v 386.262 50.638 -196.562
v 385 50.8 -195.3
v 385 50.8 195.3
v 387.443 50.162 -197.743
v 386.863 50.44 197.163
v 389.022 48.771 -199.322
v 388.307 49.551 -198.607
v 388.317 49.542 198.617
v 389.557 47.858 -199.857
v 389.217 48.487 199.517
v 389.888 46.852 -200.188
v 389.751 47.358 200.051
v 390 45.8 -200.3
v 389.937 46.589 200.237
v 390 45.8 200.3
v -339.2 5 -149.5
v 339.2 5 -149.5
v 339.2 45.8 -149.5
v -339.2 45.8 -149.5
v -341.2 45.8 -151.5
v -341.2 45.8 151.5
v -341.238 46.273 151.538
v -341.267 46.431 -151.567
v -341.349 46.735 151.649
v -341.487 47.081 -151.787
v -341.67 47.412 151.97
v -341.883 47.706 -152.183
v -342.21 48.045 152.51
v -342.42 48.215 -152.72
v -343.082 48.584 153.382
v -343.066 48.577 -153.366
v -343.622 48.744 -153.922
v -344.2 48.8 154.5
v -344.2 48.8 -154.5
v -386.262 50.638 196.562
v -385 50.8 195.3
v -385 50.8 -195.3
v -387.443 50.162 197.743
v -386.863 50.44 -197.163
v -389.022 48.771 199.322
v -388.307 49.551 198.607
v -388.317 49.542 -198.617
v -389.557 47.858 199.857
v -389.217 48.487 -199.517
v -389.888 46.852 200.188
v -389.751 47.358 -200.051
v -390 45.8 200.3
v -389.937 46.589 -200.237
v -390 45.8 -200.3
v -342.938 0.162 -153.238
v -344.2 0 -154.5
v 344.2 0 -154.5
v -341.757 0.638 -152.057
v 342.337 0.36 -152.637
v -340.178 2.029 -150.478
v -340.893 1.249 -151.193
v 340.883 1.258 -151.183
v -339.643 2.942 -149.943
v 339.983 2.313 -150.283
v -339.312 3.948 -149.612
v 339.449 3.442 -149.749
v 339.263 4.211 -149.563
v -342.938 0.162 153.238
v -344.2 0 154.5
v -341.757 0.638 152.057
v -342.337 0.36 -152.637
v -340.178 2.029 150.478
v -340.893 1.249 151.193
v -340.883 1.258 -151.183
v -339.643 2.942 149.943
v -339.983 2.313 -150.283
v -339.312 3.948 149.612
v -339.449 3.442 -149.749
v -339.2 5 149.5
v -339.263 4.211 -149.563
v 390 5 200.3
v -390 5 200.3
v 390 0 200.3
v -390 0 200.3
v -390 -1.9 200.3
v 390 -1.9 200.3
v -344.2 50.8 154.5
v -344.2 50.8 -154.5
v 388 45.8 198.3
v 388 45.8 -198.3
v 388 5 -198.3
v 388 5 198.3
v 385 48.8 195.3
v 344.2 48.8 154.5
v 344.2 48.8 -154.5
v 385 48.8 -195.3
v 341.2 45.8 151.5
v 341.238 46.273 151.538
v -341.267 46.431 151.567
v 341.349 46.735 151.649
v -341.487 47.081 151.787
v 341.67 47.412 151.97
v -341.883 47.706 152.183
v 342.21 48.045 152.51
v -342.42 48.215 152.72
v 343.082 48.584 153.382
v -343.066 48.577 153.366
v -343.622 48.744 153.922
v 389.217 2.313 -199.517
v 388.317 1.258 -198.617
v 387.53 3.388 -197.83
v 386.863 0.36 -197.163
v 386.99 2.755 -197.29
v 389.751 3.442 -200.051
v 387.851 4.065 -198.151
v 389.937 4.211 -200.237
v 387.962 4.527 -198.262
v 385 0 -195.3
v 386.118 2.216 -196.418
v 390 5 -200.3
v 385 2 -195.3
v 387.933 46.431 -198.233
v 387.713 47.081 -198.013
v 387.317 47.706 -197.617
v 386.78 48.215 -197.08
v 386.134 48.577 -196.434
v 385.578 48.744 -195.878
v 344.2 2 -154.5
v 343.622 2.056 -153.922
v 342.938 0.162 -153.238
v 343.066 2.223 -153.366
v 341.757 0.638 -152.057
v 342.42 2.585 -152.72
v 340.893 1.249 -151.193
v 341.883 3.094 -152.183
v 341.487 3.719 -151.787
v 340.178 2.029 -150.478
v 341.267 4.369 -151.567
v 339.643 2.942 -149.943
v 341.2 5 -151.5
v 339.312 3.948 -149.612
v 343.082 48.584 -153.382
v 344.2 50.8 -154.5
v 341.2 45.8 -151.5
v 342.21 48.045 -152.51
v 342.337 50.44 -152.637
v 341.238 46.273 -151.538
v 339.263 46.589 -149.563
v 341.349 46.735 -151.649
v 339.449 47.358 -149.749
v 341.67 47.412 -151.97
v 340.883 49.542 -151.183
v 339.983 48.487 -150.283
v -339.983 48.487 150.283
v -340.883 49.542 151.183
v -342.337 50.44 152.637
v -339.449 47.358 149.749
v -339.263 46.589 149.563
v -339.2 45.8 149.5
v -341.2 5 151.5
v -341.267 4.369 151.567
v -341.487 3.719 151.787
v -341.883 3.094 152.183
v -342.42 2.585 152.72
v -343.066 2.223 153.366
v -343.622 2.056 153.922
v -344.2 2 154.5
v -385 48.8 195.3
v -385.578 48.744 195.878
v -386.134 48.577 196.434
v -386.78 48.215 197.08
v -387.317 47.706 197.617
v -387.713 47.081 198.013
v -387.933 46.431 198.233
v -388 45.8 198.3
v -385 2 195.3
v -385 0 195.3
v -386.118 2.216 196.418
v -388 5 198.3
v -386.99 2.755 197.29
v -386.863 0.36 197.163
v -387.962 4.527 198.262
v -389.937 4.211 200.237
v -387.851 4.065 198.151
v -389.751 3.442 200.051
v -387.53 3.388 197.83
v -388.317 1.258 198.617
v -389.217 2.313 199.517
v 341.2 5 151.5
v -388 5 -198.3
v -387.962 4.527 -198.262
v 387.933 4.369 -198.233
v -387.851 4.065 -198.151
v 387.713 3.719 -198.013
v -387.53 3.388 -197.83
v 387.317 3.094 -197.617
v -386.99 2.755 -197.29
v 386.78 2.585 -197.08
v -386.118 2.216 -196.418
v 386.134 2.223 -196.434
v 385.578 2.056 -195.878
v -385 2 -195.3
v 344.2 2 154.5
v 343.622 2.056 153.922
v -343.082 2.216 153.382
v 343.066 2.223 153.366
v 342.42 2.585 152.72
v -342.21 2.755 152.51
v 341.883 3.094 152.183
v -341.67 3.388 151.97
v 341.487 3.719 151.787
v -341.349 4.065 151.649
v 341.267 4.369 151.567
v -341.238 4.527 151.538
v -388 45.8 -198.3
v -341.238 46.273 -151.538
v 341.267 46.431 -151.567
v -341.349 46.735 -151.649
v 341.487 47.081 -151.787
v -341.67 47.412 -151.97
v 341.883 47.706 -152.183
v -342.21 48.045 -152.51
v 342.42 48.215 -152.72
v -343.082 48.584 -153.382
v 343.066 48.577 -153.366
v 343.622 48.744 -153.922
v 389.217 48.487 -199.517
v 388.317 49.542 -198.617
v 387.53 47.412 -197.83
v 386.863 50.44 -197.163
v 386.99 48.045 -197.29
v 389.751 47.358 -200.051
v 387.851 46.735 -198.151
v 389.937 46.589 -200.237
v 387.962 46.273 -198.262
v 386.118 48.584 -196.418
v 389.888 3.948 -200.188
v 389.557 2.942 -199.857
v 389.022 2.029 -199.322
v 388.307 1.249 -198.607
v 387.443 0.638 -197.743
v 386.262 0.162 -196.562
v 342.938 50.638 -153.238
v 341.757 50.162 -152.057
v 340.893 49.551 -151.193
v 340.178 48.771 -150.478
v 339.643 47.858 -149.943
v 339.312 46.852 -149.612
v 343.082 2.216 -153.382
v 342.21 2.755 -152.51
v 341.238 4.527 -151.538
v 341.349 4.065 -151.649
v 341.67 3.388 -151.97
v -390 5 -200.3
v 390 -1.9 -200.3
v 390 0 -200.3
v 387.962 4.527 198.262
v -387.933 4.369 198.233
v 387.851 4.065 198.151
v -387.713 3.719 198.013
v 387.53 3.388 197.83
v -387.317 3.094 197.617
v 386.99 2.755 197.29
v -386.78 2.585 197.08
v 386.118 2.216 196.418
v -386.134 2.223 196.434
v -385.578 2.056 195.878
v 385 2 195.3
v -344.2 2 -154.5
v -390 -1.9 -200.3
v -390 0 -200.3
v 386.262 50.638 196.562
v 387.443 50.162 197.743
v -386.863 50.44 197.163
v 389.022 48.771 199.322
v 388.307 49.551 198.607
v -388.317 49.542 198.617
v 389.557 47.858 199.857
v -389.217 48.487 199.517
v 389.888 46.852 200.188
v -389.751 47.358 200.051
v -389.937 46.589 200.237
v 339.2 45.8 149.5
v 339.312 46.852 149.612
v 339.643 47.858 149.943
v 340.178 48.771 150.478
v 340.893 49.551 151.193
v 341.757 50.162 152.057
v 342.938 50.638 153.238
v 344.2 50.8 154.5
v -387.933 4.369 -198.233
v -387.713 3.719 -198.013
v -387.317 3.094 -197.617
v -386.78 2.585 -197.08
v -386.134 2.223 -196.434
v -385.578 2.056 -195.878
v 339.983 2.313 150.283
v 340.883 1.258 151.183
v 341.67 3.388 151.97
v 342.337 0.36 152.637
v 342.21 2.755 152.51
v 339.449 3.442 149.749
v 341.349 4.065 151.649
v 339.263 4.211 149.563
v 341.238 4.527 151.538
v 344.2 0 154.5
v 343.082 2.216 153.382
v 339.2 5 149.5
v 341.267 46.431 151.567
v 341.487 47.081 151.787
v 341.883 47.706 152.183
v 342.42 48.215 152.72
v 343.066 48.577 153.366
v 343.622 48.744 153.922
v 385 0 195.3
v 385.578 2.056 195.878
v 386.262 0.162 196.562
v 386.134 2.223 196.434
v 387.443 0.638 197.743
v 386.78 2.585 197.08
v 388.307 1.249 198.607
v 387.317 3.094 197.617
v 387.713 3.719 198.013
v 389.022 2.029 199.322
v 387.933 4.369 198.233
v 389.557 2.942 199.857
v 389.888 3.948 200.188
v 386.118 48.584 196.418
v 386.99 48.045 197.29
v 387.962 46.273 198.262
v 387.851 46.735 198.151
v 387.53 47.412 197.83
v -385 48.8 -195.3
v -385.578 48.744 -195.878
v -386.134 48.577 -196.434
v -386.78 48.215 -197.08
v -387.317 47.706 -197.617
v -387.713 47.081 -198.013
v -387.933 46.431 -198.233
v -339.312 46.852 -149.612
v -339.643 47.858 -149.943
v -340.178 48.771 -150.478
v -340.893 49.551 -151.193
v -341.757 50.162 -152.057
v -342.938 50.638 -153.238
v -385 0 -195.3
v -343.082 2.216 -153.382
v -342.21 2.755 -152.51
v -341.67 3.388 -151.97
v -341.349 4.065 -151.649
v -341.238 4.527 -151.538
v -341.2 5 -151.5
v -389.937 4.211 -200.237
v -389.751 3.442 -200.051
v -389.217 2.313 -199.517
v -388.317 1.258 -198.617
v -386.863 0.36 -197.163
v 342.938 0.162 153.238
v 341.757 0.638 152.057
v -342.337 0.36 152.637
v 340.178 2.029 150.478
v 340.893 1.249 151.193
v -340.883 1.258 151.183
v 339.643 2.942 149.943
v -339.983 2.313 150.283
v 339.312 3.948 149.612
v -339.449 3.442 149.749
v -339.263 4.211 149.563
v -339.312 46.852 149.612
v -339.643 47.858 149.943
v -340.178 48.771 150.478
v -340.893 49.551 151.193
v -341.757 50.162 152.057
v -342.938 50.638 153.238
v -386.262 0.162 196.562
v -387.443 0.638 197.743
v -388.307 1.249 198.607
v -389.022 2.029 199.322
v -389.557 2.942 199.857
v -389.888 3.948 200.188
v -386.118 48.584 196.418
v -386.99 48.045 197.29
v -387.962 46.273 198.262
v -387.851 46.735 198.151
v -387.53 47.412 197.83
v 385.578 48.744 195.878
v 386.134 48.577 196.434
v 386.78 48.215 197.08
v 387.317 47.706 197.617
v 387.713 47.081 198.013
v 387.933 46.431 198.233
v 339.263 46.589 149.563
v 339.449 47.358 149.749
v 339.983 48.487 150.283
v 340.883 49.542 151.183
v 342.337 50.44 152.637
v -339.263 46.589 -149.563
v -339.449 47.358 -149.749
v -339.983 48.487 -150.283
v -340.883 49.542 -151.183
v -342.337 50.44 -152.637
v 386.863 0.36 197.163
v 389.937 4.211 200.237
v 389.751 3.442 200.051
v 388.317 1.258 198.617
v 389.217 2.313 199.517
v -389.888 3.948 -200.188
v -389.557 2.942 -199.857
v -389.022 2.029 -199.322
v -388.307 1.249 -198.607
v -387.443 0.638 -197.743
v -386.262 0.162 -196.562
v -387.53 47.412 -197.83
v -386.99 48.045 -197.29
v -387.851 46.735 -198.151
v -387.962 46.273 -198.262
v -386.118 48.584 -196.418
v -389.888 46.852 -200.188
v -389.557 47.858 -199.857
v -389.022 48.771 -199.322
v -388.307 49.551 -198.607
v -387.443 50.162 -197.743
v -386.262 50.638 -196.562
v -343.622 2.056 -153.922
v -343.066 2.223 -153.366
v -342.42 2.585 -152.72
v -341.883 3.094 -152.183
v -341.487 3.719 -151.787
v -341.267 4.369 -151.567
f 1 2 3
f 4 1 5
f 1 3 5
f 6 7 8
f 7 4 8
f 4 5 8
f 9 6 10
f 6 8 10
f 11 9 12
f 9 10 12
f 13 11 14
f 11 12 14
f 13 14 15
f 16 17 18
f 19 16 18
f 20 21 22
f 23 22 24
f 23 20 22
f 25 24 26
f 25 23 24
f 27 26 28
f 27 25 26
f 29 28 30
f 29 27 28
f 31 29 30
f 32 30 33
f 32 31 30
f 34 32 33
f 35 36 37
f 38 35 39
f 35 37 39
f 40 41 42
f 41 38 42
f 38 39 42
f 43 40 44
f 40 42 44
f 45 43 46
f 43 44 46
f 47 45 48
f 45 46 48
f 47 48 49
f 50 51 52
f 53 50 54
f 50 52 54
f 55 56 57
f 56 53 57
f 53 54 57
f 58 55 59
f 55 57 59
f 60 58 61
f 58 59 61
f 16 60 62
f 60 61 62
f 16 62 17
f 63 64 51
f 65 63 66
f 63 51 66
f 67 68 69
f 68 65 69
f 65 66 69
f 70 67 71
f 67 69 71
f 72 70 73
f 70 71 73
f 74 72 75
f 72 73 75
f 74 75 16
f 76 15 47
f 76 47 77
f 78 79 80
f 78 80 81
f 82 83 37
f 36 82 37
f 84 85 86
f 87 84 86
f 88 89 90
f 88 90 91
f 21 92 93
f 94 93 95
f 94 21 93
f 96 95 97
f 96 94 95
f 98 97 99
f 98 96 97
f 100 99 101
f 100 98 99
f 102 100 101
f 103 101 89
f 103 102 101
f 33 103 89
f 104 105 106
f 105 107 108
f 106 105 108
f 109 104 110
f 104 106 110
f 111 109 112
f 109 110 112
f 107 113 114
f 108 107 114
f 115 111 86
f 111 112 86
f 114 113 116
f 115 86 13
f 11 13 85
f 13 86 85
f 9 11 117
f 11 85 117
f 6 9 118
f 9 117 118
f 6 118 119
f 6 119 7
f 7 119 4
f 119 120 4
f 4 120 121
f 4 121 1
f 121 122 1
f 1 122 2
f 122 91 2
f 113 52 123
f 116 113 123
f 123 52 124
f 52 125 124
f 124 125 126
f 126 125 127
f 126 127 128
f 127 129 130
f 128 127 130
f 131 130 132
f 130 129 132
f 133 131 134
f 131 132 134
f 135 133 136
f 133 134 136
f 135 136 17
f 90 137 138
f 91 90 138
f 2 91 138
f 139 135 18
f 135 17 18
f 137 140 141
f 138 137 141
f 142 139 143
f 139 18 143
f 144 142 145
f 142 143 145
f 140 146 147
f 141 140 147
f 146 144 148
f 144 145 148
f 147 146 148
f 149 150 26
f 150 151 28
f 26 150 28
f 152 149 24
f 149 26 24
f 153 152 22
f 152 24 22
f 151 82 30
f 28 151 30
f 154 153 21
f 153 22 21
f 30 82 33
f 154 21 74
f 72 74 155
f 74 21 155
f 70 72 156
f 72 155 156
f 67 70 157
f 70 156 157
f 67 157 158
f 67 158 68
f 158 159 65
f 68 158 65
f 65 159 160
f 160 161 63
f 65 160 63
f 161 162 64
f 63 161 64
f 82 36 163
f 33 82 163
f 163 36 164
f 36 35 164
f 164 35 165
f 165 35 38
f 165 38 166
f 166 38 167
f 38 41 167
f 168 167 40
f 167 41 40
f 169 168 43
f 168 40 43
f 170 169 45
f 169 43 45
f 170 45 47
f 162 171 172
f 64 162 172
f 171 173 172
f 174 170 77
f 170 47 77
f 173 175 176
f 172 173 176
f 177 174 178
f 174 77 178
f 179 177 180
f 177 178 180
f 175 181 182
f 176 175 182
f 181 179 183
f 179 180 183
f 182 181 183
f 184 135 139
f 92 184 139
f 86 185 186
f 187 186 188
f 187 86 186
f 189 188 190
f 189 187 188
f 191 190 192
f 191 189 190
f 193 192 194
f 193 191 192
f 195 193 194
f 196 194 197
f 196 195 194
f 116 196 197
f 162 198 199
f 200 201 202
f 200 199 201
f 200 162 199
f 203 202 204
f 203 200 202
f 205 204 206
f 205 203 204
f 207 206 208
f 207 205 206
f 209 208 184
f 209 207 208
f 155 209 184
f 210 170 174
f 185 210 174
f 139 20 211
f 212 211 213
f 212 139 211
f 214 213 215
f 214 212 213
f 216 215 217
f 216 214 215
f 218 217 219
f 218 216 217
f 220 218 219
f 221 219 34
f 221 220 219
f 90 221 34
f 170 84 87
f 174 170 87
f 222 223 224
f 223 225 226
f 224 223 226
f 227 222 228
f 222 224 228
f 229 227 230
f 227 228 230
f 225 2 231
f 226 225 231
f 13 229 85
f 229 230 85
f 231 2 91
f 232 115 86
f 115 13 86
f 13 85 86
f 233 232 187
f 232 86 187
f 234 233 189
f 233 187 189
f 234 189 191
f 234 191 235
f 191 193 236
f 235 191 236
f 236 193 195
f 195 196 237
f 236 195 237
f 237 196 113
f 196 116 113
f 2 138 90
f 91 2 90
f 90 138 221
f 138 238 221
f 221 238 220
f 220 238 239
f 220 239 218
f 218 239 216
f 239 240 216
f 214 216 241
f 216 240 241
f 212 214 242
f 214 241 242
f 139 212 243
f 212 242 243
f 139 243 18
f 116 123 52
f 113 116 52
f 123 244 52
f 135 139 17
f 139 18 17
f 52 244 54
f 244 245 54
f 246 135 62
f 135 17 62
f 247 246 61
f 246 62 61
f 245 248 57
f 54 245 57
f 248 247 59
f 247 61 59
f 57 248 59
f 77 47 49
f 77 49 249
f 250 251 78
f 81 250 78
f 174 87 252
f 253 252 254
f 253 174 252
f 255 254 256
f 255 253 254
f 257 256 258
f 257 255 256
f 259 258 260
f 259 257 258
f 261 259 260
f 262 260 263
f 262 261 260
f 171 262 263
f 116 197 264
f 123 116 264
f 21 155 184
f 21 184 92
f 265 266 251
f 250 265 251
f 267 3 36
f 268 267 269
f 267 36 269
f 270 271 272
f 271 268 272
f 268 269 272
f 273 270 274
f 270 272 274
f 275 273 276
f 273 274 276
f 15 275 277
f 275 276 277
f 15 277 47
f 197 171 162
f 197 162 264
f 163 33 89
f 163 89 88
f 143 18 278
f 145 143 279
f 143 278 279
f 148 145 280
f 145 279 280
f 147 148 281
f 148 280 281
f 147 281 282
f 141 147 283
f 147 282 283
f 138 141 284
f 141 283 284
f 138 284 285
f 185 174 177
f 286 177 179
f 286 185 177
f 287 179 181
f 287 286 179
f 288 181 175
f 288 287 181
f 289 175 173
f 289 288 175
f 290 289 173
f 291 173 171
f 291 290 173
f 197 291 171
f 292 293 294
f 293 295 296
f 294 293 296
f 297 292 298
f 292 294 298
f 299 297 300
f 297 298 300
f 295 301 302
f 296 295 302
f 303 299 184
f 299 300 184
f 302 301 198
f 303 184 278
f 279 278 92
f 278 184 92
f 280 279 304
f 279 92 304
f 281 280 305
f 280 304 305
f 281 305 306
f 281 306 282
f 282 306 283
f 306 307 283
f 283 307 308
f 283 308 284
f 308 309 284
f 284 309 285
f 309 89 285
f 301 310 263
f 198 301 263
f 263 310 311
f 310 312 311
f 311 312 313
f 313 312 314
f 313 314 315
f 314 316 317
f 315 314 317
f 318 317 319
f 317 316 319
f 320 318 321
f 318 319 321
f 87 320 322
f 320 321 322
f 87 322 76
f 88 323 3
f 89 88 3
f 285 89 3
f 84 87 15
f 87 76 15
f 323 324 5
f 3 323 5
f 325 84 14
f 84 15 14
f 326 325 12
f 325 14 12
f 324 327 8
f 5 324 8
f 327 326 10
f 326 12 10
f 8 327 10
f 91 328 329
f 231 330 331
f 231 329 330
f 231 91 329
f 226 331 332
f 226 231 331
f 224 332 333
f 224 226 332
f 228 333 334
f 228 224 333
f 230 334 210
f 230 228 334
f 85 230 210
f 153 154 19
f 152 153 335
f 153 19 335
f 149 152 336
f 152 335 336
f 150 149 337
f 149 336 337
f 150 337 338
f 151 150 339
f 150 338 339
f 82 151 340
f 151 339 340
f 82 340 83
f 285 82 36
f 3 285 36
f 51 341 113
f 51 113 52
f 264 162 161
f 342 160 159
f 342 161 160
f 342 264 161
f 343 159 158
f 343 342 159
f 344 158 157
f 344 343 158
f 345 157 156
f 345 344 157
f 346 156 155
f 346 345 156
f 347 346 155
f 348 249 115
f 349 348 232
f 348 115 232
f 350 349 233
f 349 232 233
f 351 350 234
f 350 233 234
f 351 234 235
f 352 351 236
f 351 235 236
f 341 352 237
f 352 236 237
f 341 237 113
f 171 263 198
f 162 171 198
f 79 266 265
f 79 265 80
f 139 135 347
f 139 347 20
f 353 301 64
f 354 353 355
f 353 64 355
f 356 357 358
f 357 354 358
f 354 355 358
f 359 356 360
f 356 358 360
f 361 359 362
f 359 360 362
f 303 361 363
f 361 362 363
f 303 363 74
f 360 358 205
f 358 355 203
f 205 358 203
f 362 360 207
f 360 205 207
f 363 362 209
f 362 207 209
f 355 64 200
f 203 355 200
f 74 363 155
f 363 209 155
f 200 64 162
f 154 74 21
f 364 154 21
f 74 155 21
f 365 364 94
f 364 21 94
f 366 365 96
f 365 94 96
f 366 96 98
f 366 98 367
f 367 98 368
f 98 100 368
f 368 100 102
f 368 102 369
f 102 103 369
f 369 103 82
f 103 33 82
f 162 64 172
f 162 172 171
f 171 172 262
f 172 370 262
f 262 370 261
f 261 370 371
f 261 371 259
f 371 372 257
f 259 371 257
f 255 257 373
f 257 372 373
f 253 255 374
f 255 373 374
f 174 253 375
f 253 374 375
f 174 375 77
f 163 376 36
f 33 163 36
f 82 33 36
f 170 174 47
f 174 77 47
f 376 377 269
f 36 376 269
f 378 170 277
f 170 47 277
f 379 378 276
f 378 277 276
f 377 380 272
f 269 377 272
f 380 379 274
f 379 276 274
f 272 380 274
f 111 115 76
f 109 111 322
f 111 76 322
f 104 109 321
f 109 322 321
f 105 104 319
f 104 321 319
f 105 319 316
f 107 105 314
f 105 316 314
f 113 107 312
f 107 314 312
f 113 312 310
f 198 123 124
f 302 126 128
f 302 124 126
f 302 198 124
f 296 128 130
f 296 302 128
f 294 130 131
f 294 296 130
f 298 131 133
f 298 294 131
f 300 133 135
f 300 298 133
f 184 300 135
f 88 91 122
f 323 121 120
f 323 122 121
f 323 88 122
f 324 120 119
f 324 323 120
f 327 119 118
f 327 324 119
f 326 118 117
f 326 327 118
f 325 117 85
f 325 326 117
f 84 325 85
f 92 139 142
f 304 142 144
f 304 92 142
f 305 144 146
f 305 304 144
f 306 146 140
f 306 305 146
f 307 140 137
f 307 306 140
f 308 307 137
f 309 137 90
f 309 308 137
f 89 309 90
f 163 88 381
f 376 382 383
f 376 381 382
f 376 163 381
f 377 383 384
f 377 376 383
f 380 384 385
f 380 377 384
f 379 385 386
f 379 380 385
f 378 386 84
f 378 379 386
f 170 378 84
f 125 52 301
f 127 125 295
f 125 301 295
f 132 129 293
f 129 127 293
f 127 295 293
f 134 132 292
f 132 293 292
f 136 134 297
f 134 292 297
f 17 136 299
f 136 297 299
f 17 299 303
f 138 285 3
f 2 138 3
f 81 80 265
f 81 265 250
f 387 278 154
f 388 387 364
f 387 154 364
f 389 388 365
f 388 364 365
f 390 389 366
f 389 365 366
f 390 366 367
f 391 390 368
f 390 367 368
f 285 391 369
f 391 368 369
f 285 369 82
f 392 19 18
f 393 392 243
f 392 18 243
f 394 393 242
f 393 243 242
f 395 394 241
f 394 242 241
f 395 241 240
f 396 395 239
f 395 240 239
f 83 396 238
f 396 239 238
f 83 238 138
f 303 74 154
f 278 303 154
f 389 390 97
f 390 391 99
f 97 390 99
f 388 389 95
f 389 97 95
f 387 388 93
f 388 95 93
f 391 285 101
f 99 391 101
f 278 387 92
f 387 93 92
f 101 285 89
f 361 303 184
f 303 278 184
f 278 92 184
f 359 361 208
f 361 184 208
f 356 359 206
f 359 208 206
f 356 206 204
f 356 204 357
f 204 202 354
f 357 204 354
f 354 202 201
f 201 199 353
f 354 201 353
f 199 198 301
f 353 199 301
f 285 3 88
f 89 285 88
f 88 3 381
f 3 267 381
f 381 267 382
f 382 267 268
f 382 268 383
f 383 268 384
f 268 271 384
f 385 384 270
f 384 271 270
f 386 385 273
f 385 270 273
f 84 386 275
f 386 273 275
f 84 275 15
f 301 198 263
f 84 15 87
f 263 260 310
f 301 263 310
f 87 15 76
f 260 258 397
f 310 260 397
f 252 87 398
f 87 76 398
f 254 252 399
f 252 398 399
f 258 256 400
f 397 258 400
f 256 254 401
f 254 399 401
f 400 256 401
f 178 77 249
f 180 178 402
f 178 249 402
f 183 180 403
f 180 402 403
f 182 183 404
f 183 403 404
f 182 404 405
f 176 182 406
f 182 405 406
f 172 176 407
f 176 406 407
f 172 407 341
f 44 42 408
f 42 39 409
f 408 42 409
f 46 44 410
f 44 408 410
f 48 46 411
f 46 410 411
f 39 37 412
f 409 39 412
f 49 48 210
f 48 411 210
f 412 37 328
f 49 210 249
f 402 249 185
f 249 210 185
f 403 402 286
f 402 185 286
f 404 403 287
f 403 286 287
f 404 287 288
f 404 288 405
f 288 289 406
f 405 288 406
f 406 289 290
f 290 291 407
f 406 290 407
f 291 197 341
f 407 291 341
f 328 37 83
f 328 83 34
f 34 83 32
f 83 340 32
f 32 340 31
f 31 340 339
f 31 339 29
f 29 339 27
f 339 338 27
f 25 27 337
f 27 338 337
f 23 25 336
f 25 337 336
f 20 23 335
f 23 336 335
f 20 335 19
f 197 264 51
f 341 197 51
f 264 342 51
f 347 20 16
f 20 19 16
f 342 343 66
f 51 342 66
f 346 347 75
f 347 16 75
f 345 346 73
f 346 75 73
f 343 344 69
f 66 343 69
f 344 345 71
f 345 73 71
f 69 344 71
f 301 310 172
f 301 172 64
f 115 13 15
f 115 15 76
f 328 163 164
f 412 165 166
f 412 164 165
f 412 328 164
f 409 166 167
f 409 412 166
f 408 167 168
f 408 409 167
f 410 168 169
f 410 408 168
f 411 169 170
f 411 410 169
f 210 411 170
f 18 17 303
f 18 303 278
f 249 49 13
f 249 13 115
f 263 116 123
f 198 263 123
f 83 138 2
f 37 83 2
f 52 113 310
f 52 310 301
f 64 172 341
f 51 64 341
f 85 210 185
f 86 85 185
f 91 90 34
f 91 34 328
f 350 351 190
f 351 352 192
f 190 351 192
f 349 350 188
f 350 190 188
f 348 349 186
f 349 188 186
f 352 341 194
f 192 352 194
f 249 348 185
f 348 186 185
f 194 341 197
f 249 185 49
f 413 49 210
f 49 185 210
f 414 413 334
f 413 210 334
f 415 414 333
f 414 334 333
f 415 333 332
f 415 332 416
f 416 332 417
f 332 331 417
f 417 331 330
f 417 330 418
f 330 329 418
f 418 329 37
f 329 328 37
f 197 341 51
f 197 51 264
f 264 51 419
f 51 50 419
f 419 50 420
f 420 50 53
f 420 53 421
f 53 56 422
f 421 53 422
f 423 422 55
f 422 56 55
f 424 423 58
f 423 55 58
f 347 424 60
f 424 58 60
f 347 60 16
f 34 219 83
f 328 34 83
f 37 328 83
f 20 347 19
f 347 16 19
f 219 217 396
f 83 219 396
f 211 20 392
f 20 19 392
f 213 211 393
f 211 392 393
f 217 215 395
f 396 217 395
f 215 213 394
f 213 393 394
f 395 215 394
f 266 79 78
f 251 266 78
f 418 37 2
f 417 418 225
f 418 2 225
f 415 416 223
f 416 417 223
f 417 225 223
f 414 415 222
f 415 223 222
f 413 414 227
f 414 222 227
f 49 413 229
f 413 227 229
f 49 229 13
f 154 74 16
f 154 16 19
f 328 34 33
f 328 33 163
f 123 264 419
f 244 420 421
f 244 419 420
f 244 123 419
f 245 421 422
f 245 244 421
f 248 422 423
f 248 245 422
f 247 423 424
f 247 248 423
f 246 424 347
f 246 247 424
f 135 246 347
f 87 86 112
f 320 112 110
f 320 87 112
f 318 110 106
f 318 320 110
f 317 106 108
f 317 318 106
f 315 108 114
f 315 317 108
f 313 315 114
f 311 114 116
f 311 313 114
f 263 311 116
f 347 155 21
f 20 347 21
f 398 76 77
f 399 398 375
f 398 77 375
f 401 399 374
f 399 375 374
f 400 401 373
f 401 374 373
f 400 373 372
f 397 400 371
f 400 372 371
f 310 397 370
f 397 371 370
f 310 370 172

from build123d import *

# Parameters (mm, degrees)
TUBO_CUADRADO_2_X_2_X_0_25_1_DEPTH      = 473.442048969
TUBO_CUADRADO_2_X_2_X_0_25_1_DEPTH_BACK = 72.842048969
TUBO_CUADRADO_2_X_2_X_0_25_1_2_DEPTH    = 925.684097937
TUBO_CUADRADO_2_X_2_X_0_25_1_3_DEPTH    = 546.284097937
TUBO_CUADRADO_2_X_2_X_0_25_1_4_DEPTH    = 925.684097937
CROQUIS3_W                              = 780
CROQUIS3_H                              = 400.6
SALIENTE_EXTRUIR1_DEPTH                 = 1.9


with BuildPart() as part:
    # Sketch1 → Tubo cuadrado 2 X 2 X 0.25(1) (new, two sides: drawn at the far end of the back side and taken through both)
    with BuildSketch(Plane(origin=(-364.6, 25.4, -200.3), x_dir=(1, 0, 0), z_dir=(0, 0, 1)).offset(-TUBO_CUADRADO_2_X_2_X_0_25_1_DEPTH_BACK)):
        with BuildLine():
            Line((-20.4, -25.4), (20.4, -25.4))
            ThreePointArc((20.4, -25.4), (23.935533906, -23.935533906), (25.4, -20.4))
            Line((25.4, -20.4), (25.4, 20.4))
            ThreePointArc((25.4, 20.4), (23.935533906, 23.935533906), (20.4, 25.4))
            Line((20.4, 25.4), (-20.4, 25.4))
            ThreePointArc((-20.4, 25.4), (-23.935533906, 23.935533906), (-25.4, 20.4))
            Line((-25.4, 20.4), (-25.4, -20.4))
            ThreePointArc((-25.4, -20.4), (-23.935533906, -23.935533906), (-20.4, -25.4))
        make_face()
        with BuildLine():
            Line((-20.4, -23.4), (20.4, -23.4))
            ThreePointArc((20.4, -23.4), (22.521320344, -22.521320344), (23.4, -20.4))
            Line((23.4, -20.4), (23.4, 20.4))
            ThreePointArc((23.4, 20.4), (22.521320344, 22.521320344), (20.4, 23.4))
            Line((20.4, 23.4), (-20.4, 23.4))
            ThreePointArc((-20.4, 23.4), (-22.521320344, 22.521320344), (-23.4, 20.4))
            Line((-23.4, 20.4), (-23.4, -20.4))
            ThreePointArc((-23.4, -20.4), (-22.521320344, -22.521320344), (-20.4, -23.4))
        make_face(mode=Mode.SUBTRACT)
    extrude(amount=TUBO_CUADRADO_2_X_2_X_0_25_1_DEPTH + TUBO_CUADRADO_2_X_2_X_0_25_1_DEPTH_BACK)

    # Tubo cuadrado 2 X 2 X 0.25(1) mitre 1
    split(bisect_by=Plane(origin=(-390, 0, -200.3), x_dir=(0, -1, 0), z_dir=(-0.707106781, 0, 0.707106781)), keep=Keep.TOP)

    # Tubo cuadrado 2 X 2 X 0.25(1) mitre 2
    split(bisect_by=Plane(origin=(-390, 0, 200.3), x_dir=(0, -1, 0), z_dir=(-0.707106781, 0, -0.707106781)), keep=Keep.TOP)


with BuildPart() as body_2:
    # Sketch1 on segment 2 (carried to segment 2) → Tubo cuadrado 2 X 2 X 0.25_1 2 (new body)
    with BuildSketch(Plane(origin=(-462.842048969, 25.4, 174.9), x_dir=(0, 0, -1), z_dir=(1, 0, 0))):
        with BuildLine():
            Line((-20.4, -25.4), (20.4, -25.4))
            ThreePointArc((20.4, -25.4), (23.935533906, -23.935533906), (25.4, -20.4))
            Line((25.4, -20.4), (25.4, 20.4))
            ThreePointArc((25.4, 20.4), (23.935533906, 23.935533906), (20.4, 25.4))
            Line((20.4, 25.4), (-20.4, 25.4))
            ThreePointArc((-20.4, 25.4), (-23.935533906, 23.935533906), (-25.4, 20.4))
            Line((-25.4, 20.4), (-25.4, -20.4))
            ThreePointArc((-25.4, -20.4), (-23.935533906, -23.935533906), (-20.4, -25.4))
        make_face()
        with BuildLine():
            Line((-20.4, -23.4), (20.4, -23.4))
            ThreePointArc((20.4, -23.4), (22.521320344, -22.521320344), (23.4, -20.4))
            Line((23.4, -20.4), (23.4, 20.4))
            ThreePointArc((23.4, 20.4), (22.521320344, 22.521320344), (20.4, 23.4))
            Line((20.4, 23.4), (-20.4, 23.4))
            ThreePointArc((-20.4, 23.4), (-22.521320344, 22.521320344), (-23.4, 20.4))
            Line((-23.4, 20.4), (-23.4, -20.4))
            ThreePointArc((-23.4, -20.4), (-22.521320344, -22.521320344), (-20.4, -23.4))
        make_face(mode=Mode.SUBTRACT)
    extrude(amount=TUBO_CUADRADO_2_X_2_X_0_25_1_2_DEPTH)

    # Tubo cuadrado 2 X 2 X 0.25_1 2 mitre 1
    split(bisect_by=Plane(origin=(-390, 0, 200.3), x_dir=(0, 1, 0), z_dir=(0.707106781, 0, 0.707106781)), keep=Keep.TOP)

    # Tubo cuadrado 2 X 2 X 0.25_1 2 mitre 2
    split(bisect_by=Plane(origin=(390, 0, 200.3), x_dir=(0, -1, 0), z_dir=(-0.707106781, 0, 0.707106781)), keep=Keep.TOP)


with BuildPart() as body_3:
    # Sketch1 on segment 3 (carried to segment 3) → Tubo cuadrado 2 X 2 X 0.25_1 3 (new body)
    with BuildSketch(Plane(origin=(364.6, 25.4, 273.142048969), x_dir=(-1, 0, 0), z_dir=(0, 0, -1))):
        with BuildLine():
            Line((-20.4, -25.4), (20.4, -25.4))
            ThreePointArc((20.4, -25.4), (23.935533906, -23.935533906), (25.4, -20.4))
            Line((25.4, -20.4), (25.4, 20.4))
            ThreePointArc((25.4, 20.4), (23.935533906, 23.935533906), (20.4, 25.4))
            Line((20.4, 25.4), (-20.4, 25.4))
            ThreePointArc((-20.4, 25.4), (-23.935533906, 23.935533906), (-25.4, 20.4))
            Line((-25.4, 20.4), (-25.4, -20.4))
            ThreePointArc((-25.4, -20.4), (-23.935533906, -23.935533906), (-20.4, -25.4))
        make_face()
        with BuildLine():
            Line((-20.4, -23.4), (20.4, -23.4))
            ThreePointArc((20.4, -23.4), (22.521320344, -22.521320344), (23.4, -20.4))
            Line((23.4, -20.4), (23.4, 20.4))
            ThreePointArc((23.4, 20.4), (22.521320344, 22.521320344), (20.4, 23.4))
            Line((20.4, 23.4), (-20.4, 23.4))
            ThreePointArc((-20.4, 23.4), (-22.521320344, 22.521320344), (-23.4, 20.4))
            Line((-23.4, 20.4), (-23.4, -20.4))
            ThreePointArc((-23.4, -20.4), (-22.521320344, -22.521320344), (-20.4, -23.4))
        make_face(mode=Mode.SUBTRACT)
    extrude(amount=TUBO_CUADRADO_2_X_2_X_0_25_1_3_DEPTH)

    # Tubo cuadrado 2 X 2 X 0.25_1 3 mitre 1
    split(bisect_by=Plane(origin=(390, 0, -200.3), x_dir=(0, 1, 0), z_dir=(0.707106781, 0, 0.707106781)), keep=Keep.TOP)

    # Tubo cuadrado 2 X 2 X 0.25_1 3 mitre 2
    split(bisect_by=Plane(origin=(390, 0, 200.3), x_dir=(0, 1, 0), z_dir=(0.707106781, 0, -0.707106781)), keep=Keep.TOP)


with BuildPart() as body_4:
    # Sketch1 on segment 4 (carried to segment 4) → Tubo cuadrado 2 X 2 X 0.25_1 4 (new body)
    with BuildSketch(Plane(origin=(462.842048969, 25.4, -174.9), x_dir=(0, 0, 1), z_dir=(-1, 0, 0))):
        with BuildLine():
            Line((-20.4, -25.4), (20.4, -25.4))
            ThreePointArc((20.4, -25.4), (23.935533906, -23.935533906), (25.4, -20.4))
            Line((25.4, -20.4), (25.4, 20.4))
            ThreePointArc((25.4, 20.4), (23.935533906, 23.935533906), (20.4, 25.4))
            Line((20.4, 25.4), (-20.4, 25.4))
            ThreePointArc((-20.4, 25.4), (-23.935533906, 23.935533906), (-25.4, 20.4))
            Line((-25.4, 20.4), (-25.4, -20.4))
            ThreePointArc((-25.4, -20.4), (-23.935533906, -23.935533906), (-20.4, -25.4))
        make_face()
        with BuildLine():
            Line((-20.4, -23.4), (20.4, -23.4))
            ThreePointArc((20.4, -23.4), (22.521320344, -22.521320344), (23.4, -20.4))
            Line((23.4, -20.4), (23.4, 20.4))
            ThreePointArc((23.4, 20.4), (22.521320344, 22.521320344), (20.4, 23.4))
            Line((20.4, 23.4), (-20.4, 23.4))
            ThreePointArc((-20.4, 23.4), (-22.521320344, 22.521320344), (-23.4, 20.4))
            Line((-23.4, 20.4), (-23.4, -20.4))
            ThreePointArc((-23.4, -20.4), (-22.521320344, -22.521320344), (-20.4, -23.4))
        make_face(mode=Mode.SUBTRACT)
    extrude(amount=TUBO_CUADRADO_2_X_2_X_0_25_1_4_DEPTH)

    # Tubo cuadrado 2 X 2 X 0.25_1 4 mitre 1
    split(bisect_by=Plane(origin=(-390, 0, -200.3), x_dir=(0, 1, 0), z_dir=(0.707106781, 0, -0.707106781)), keep=Keep.TOP)

    # Tubo cuadrado 2 X 2 X 0.25_1 4 mitre 2
    split(bisect_by=Plane(origin=(390, 0, -200.3), x_dir=(0, -1, 0), z_dir=(-0.707106781, 0, -0.707106781)), keep=Keep.TOP)


with BuildPart() as body_5:
    # Croquis3 → Saliente-Extruir1 (new body)
    with BuildSketch(Plane.XZ):
        Rectangle(CROQUIS3_W, CROQUIS3_H)
    extrude(amount=SALIENTE_EXTRUIR1_DEPTH)


solid = Compound([part.part, body_2.part, body_3.part, body_4.part, body_5.part])
